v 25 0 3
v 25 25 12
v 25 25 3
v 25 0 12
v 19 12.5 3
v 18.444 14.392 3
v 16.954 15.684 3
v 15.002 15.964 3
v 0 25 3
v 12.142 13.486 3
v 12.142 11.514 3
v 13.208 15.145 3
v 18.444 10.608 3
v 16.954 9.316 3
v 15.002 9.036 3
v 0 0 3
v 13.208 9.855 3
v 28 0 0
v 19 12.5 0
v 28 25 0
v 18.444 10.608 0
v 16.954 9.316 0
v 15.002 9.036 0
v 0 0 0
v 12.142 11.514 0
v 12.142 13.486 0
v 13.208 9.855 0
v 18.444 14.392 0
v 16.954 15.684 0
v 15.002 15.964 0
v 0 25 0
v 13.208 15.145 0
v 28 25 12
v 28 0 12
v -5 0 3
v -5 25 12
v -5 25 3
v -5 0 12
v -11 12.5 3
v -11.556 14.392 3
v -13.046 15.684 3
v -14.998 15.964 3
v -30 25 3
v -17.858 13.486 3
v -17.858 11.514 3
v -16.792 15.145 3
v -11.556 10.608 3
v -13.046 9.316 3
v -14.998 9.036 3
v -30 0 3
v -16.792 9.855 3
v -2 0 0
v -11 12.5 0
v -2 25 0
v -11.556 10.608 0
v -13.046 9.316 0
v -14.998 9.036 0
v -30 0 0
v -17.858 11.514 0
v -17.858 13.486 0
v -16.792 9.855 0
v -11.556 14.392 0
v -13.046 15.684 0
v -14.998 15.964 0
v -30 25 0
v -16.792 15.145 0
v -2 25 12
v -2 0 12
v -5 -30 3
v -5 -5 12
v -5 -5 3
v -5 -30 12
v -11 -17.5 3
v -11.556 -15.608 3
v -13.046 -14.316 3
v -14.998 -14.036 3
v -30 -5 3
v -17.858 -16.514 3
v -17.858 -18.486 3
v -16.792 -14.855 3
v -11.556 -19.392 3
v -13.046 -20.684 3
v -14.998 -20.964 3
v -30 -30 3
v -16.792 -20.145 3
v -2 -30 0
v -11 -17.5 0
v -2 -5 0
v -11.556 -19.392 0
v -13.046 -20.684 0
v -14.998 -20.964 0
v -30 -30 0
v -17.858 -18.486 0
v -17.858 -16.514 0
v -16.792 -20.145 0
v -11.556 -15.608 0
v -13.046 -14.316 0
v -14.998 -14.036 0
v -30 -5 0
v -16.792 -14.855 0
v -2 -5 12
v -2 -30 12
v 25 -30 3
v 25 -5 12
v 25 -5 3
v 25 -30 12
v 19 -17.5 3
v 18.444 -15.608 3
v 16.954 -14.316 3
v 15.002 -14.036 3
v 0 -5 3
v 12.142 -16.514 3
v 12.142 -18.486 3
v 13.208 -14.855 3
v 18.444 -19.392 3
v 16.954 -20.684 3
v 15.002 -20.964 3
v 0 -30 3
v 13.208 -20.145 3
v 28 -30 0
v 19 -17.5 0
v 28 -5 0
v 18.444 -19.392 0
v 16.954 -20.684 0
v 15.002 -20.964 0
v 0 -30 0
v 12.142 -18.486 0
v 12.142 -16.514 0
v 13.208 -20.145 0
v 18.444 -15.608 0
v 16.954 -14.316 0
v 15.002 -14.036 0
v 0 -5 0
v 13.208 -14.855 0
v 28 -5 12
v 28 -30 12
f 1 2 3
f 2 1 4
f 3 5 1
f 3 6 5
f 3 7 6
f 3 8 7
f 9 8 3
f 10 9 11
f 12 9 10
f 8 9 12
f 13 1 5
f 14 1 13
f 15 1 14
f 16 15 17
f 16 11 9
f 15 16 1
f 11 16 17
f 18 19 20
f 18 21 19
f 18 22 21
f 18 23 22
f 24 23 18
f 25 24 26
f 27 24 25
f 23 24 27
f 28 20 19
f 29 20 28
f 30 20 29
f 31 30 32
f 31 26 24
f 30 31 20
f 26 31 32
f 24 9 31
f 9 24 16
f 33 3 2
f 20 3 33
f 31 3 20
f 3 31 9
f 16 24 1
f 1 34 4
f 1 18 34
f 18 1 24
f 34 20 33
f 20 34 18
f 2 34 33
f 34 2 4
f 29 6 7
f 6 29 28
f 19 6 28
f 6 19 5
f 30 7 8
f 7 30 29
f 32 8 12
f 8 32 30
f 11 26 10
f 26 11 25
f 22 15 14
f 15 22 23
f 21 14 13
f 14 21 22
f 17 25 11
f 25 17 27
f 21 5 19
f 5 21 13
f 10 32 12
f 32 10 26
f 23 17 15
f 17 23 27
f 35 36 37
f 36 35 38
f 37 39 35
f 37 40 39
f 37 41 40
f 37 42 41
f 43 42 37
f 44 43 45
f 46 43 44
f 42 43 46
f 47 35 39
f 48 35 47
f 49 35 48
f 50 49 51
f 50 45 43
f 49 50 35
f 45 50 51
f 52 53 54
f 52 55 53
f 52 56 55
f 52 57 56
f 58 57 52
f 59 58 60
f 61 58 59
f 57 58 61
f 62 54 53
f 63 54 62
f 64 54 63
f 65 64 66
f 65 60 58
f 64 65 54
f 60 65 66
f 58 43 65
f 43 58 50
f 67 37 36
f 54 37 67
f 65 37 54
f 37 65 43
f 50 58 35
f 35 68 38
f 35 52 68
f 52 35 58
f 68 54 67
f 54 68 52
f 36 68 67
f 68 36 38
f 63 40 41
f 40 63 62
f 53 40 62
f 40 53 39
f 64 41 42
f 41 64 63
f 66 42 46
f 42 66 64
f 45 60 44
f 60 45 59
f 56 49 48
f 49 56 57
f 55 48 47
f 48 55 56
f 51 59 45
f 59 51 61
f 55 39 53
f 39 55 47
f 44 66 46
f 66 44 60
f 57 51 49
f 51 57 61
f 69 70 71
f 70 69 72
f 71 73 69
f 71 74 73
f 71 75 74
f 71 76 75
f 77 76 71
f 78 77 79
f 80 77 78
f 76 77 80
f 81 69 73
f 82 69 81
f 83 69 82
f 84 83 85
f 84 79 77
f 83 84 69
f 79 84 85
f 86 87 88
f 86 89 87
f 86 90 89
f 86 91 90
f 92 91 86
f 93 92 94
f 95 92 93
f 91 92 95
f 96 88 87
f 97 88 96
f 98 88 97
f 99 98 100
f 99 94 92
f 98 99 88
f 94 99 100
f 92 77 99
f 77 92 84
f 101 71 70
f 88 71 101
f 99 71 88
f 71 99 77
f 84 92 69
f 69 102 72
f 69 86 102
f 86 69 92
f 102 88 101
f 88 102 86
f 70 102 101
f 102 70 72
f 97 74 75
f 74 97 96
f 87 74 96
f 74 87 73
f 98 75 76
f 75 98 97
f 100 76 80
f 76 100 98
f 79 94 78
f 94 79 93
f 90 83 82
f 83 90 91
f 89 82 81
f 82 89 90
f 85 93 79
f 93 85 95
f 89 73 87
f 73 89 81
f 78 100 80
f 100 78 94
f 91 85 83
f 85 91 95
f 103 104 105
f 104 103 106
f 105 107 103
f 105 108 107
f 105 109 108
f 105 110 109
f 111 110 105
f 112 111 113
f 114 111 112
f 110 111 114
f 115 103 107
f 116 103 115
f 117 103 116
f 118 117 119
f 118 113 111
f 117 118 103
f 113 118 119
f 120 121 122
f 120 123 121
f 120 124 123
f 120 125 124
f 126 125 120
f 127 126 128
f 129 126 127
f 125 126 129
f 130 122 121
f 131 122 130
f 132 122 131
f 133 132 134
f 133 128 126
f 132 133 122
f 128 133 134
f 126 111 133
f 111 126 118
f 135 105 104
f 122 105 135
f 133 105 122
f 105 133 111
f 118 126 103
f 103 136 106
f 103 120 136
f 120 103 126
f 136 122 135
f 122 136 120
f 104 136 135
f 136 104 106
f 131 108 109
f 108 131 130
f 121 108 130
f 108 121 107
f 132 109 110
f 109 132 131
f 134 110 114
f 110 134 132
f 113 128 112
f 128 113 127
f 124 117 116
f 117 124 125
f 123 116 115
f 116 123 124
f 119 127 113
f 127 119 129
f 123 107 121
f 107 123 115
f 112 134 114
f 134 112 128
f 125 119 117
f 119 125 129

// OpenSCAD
width = 25;
depth = 25;
thickness = 3;
rim = 12;

spacer();

translate([-width - 5, 0, 0]) spacer();

translate([-width - 5, -depth - 5, 0]) spacer();

translate([0, -depth - 5, 0]) spacer();

module spacer(){

difference(){
	union(){
		cube([depth,width, thickness]);
		translate([depth,0,0]) cube([thickness, width , rim]);
	}

	translate([depth / 2 + 3, width / 2, -.1])
	cylinder(r=3.5, h=25);
}

}
